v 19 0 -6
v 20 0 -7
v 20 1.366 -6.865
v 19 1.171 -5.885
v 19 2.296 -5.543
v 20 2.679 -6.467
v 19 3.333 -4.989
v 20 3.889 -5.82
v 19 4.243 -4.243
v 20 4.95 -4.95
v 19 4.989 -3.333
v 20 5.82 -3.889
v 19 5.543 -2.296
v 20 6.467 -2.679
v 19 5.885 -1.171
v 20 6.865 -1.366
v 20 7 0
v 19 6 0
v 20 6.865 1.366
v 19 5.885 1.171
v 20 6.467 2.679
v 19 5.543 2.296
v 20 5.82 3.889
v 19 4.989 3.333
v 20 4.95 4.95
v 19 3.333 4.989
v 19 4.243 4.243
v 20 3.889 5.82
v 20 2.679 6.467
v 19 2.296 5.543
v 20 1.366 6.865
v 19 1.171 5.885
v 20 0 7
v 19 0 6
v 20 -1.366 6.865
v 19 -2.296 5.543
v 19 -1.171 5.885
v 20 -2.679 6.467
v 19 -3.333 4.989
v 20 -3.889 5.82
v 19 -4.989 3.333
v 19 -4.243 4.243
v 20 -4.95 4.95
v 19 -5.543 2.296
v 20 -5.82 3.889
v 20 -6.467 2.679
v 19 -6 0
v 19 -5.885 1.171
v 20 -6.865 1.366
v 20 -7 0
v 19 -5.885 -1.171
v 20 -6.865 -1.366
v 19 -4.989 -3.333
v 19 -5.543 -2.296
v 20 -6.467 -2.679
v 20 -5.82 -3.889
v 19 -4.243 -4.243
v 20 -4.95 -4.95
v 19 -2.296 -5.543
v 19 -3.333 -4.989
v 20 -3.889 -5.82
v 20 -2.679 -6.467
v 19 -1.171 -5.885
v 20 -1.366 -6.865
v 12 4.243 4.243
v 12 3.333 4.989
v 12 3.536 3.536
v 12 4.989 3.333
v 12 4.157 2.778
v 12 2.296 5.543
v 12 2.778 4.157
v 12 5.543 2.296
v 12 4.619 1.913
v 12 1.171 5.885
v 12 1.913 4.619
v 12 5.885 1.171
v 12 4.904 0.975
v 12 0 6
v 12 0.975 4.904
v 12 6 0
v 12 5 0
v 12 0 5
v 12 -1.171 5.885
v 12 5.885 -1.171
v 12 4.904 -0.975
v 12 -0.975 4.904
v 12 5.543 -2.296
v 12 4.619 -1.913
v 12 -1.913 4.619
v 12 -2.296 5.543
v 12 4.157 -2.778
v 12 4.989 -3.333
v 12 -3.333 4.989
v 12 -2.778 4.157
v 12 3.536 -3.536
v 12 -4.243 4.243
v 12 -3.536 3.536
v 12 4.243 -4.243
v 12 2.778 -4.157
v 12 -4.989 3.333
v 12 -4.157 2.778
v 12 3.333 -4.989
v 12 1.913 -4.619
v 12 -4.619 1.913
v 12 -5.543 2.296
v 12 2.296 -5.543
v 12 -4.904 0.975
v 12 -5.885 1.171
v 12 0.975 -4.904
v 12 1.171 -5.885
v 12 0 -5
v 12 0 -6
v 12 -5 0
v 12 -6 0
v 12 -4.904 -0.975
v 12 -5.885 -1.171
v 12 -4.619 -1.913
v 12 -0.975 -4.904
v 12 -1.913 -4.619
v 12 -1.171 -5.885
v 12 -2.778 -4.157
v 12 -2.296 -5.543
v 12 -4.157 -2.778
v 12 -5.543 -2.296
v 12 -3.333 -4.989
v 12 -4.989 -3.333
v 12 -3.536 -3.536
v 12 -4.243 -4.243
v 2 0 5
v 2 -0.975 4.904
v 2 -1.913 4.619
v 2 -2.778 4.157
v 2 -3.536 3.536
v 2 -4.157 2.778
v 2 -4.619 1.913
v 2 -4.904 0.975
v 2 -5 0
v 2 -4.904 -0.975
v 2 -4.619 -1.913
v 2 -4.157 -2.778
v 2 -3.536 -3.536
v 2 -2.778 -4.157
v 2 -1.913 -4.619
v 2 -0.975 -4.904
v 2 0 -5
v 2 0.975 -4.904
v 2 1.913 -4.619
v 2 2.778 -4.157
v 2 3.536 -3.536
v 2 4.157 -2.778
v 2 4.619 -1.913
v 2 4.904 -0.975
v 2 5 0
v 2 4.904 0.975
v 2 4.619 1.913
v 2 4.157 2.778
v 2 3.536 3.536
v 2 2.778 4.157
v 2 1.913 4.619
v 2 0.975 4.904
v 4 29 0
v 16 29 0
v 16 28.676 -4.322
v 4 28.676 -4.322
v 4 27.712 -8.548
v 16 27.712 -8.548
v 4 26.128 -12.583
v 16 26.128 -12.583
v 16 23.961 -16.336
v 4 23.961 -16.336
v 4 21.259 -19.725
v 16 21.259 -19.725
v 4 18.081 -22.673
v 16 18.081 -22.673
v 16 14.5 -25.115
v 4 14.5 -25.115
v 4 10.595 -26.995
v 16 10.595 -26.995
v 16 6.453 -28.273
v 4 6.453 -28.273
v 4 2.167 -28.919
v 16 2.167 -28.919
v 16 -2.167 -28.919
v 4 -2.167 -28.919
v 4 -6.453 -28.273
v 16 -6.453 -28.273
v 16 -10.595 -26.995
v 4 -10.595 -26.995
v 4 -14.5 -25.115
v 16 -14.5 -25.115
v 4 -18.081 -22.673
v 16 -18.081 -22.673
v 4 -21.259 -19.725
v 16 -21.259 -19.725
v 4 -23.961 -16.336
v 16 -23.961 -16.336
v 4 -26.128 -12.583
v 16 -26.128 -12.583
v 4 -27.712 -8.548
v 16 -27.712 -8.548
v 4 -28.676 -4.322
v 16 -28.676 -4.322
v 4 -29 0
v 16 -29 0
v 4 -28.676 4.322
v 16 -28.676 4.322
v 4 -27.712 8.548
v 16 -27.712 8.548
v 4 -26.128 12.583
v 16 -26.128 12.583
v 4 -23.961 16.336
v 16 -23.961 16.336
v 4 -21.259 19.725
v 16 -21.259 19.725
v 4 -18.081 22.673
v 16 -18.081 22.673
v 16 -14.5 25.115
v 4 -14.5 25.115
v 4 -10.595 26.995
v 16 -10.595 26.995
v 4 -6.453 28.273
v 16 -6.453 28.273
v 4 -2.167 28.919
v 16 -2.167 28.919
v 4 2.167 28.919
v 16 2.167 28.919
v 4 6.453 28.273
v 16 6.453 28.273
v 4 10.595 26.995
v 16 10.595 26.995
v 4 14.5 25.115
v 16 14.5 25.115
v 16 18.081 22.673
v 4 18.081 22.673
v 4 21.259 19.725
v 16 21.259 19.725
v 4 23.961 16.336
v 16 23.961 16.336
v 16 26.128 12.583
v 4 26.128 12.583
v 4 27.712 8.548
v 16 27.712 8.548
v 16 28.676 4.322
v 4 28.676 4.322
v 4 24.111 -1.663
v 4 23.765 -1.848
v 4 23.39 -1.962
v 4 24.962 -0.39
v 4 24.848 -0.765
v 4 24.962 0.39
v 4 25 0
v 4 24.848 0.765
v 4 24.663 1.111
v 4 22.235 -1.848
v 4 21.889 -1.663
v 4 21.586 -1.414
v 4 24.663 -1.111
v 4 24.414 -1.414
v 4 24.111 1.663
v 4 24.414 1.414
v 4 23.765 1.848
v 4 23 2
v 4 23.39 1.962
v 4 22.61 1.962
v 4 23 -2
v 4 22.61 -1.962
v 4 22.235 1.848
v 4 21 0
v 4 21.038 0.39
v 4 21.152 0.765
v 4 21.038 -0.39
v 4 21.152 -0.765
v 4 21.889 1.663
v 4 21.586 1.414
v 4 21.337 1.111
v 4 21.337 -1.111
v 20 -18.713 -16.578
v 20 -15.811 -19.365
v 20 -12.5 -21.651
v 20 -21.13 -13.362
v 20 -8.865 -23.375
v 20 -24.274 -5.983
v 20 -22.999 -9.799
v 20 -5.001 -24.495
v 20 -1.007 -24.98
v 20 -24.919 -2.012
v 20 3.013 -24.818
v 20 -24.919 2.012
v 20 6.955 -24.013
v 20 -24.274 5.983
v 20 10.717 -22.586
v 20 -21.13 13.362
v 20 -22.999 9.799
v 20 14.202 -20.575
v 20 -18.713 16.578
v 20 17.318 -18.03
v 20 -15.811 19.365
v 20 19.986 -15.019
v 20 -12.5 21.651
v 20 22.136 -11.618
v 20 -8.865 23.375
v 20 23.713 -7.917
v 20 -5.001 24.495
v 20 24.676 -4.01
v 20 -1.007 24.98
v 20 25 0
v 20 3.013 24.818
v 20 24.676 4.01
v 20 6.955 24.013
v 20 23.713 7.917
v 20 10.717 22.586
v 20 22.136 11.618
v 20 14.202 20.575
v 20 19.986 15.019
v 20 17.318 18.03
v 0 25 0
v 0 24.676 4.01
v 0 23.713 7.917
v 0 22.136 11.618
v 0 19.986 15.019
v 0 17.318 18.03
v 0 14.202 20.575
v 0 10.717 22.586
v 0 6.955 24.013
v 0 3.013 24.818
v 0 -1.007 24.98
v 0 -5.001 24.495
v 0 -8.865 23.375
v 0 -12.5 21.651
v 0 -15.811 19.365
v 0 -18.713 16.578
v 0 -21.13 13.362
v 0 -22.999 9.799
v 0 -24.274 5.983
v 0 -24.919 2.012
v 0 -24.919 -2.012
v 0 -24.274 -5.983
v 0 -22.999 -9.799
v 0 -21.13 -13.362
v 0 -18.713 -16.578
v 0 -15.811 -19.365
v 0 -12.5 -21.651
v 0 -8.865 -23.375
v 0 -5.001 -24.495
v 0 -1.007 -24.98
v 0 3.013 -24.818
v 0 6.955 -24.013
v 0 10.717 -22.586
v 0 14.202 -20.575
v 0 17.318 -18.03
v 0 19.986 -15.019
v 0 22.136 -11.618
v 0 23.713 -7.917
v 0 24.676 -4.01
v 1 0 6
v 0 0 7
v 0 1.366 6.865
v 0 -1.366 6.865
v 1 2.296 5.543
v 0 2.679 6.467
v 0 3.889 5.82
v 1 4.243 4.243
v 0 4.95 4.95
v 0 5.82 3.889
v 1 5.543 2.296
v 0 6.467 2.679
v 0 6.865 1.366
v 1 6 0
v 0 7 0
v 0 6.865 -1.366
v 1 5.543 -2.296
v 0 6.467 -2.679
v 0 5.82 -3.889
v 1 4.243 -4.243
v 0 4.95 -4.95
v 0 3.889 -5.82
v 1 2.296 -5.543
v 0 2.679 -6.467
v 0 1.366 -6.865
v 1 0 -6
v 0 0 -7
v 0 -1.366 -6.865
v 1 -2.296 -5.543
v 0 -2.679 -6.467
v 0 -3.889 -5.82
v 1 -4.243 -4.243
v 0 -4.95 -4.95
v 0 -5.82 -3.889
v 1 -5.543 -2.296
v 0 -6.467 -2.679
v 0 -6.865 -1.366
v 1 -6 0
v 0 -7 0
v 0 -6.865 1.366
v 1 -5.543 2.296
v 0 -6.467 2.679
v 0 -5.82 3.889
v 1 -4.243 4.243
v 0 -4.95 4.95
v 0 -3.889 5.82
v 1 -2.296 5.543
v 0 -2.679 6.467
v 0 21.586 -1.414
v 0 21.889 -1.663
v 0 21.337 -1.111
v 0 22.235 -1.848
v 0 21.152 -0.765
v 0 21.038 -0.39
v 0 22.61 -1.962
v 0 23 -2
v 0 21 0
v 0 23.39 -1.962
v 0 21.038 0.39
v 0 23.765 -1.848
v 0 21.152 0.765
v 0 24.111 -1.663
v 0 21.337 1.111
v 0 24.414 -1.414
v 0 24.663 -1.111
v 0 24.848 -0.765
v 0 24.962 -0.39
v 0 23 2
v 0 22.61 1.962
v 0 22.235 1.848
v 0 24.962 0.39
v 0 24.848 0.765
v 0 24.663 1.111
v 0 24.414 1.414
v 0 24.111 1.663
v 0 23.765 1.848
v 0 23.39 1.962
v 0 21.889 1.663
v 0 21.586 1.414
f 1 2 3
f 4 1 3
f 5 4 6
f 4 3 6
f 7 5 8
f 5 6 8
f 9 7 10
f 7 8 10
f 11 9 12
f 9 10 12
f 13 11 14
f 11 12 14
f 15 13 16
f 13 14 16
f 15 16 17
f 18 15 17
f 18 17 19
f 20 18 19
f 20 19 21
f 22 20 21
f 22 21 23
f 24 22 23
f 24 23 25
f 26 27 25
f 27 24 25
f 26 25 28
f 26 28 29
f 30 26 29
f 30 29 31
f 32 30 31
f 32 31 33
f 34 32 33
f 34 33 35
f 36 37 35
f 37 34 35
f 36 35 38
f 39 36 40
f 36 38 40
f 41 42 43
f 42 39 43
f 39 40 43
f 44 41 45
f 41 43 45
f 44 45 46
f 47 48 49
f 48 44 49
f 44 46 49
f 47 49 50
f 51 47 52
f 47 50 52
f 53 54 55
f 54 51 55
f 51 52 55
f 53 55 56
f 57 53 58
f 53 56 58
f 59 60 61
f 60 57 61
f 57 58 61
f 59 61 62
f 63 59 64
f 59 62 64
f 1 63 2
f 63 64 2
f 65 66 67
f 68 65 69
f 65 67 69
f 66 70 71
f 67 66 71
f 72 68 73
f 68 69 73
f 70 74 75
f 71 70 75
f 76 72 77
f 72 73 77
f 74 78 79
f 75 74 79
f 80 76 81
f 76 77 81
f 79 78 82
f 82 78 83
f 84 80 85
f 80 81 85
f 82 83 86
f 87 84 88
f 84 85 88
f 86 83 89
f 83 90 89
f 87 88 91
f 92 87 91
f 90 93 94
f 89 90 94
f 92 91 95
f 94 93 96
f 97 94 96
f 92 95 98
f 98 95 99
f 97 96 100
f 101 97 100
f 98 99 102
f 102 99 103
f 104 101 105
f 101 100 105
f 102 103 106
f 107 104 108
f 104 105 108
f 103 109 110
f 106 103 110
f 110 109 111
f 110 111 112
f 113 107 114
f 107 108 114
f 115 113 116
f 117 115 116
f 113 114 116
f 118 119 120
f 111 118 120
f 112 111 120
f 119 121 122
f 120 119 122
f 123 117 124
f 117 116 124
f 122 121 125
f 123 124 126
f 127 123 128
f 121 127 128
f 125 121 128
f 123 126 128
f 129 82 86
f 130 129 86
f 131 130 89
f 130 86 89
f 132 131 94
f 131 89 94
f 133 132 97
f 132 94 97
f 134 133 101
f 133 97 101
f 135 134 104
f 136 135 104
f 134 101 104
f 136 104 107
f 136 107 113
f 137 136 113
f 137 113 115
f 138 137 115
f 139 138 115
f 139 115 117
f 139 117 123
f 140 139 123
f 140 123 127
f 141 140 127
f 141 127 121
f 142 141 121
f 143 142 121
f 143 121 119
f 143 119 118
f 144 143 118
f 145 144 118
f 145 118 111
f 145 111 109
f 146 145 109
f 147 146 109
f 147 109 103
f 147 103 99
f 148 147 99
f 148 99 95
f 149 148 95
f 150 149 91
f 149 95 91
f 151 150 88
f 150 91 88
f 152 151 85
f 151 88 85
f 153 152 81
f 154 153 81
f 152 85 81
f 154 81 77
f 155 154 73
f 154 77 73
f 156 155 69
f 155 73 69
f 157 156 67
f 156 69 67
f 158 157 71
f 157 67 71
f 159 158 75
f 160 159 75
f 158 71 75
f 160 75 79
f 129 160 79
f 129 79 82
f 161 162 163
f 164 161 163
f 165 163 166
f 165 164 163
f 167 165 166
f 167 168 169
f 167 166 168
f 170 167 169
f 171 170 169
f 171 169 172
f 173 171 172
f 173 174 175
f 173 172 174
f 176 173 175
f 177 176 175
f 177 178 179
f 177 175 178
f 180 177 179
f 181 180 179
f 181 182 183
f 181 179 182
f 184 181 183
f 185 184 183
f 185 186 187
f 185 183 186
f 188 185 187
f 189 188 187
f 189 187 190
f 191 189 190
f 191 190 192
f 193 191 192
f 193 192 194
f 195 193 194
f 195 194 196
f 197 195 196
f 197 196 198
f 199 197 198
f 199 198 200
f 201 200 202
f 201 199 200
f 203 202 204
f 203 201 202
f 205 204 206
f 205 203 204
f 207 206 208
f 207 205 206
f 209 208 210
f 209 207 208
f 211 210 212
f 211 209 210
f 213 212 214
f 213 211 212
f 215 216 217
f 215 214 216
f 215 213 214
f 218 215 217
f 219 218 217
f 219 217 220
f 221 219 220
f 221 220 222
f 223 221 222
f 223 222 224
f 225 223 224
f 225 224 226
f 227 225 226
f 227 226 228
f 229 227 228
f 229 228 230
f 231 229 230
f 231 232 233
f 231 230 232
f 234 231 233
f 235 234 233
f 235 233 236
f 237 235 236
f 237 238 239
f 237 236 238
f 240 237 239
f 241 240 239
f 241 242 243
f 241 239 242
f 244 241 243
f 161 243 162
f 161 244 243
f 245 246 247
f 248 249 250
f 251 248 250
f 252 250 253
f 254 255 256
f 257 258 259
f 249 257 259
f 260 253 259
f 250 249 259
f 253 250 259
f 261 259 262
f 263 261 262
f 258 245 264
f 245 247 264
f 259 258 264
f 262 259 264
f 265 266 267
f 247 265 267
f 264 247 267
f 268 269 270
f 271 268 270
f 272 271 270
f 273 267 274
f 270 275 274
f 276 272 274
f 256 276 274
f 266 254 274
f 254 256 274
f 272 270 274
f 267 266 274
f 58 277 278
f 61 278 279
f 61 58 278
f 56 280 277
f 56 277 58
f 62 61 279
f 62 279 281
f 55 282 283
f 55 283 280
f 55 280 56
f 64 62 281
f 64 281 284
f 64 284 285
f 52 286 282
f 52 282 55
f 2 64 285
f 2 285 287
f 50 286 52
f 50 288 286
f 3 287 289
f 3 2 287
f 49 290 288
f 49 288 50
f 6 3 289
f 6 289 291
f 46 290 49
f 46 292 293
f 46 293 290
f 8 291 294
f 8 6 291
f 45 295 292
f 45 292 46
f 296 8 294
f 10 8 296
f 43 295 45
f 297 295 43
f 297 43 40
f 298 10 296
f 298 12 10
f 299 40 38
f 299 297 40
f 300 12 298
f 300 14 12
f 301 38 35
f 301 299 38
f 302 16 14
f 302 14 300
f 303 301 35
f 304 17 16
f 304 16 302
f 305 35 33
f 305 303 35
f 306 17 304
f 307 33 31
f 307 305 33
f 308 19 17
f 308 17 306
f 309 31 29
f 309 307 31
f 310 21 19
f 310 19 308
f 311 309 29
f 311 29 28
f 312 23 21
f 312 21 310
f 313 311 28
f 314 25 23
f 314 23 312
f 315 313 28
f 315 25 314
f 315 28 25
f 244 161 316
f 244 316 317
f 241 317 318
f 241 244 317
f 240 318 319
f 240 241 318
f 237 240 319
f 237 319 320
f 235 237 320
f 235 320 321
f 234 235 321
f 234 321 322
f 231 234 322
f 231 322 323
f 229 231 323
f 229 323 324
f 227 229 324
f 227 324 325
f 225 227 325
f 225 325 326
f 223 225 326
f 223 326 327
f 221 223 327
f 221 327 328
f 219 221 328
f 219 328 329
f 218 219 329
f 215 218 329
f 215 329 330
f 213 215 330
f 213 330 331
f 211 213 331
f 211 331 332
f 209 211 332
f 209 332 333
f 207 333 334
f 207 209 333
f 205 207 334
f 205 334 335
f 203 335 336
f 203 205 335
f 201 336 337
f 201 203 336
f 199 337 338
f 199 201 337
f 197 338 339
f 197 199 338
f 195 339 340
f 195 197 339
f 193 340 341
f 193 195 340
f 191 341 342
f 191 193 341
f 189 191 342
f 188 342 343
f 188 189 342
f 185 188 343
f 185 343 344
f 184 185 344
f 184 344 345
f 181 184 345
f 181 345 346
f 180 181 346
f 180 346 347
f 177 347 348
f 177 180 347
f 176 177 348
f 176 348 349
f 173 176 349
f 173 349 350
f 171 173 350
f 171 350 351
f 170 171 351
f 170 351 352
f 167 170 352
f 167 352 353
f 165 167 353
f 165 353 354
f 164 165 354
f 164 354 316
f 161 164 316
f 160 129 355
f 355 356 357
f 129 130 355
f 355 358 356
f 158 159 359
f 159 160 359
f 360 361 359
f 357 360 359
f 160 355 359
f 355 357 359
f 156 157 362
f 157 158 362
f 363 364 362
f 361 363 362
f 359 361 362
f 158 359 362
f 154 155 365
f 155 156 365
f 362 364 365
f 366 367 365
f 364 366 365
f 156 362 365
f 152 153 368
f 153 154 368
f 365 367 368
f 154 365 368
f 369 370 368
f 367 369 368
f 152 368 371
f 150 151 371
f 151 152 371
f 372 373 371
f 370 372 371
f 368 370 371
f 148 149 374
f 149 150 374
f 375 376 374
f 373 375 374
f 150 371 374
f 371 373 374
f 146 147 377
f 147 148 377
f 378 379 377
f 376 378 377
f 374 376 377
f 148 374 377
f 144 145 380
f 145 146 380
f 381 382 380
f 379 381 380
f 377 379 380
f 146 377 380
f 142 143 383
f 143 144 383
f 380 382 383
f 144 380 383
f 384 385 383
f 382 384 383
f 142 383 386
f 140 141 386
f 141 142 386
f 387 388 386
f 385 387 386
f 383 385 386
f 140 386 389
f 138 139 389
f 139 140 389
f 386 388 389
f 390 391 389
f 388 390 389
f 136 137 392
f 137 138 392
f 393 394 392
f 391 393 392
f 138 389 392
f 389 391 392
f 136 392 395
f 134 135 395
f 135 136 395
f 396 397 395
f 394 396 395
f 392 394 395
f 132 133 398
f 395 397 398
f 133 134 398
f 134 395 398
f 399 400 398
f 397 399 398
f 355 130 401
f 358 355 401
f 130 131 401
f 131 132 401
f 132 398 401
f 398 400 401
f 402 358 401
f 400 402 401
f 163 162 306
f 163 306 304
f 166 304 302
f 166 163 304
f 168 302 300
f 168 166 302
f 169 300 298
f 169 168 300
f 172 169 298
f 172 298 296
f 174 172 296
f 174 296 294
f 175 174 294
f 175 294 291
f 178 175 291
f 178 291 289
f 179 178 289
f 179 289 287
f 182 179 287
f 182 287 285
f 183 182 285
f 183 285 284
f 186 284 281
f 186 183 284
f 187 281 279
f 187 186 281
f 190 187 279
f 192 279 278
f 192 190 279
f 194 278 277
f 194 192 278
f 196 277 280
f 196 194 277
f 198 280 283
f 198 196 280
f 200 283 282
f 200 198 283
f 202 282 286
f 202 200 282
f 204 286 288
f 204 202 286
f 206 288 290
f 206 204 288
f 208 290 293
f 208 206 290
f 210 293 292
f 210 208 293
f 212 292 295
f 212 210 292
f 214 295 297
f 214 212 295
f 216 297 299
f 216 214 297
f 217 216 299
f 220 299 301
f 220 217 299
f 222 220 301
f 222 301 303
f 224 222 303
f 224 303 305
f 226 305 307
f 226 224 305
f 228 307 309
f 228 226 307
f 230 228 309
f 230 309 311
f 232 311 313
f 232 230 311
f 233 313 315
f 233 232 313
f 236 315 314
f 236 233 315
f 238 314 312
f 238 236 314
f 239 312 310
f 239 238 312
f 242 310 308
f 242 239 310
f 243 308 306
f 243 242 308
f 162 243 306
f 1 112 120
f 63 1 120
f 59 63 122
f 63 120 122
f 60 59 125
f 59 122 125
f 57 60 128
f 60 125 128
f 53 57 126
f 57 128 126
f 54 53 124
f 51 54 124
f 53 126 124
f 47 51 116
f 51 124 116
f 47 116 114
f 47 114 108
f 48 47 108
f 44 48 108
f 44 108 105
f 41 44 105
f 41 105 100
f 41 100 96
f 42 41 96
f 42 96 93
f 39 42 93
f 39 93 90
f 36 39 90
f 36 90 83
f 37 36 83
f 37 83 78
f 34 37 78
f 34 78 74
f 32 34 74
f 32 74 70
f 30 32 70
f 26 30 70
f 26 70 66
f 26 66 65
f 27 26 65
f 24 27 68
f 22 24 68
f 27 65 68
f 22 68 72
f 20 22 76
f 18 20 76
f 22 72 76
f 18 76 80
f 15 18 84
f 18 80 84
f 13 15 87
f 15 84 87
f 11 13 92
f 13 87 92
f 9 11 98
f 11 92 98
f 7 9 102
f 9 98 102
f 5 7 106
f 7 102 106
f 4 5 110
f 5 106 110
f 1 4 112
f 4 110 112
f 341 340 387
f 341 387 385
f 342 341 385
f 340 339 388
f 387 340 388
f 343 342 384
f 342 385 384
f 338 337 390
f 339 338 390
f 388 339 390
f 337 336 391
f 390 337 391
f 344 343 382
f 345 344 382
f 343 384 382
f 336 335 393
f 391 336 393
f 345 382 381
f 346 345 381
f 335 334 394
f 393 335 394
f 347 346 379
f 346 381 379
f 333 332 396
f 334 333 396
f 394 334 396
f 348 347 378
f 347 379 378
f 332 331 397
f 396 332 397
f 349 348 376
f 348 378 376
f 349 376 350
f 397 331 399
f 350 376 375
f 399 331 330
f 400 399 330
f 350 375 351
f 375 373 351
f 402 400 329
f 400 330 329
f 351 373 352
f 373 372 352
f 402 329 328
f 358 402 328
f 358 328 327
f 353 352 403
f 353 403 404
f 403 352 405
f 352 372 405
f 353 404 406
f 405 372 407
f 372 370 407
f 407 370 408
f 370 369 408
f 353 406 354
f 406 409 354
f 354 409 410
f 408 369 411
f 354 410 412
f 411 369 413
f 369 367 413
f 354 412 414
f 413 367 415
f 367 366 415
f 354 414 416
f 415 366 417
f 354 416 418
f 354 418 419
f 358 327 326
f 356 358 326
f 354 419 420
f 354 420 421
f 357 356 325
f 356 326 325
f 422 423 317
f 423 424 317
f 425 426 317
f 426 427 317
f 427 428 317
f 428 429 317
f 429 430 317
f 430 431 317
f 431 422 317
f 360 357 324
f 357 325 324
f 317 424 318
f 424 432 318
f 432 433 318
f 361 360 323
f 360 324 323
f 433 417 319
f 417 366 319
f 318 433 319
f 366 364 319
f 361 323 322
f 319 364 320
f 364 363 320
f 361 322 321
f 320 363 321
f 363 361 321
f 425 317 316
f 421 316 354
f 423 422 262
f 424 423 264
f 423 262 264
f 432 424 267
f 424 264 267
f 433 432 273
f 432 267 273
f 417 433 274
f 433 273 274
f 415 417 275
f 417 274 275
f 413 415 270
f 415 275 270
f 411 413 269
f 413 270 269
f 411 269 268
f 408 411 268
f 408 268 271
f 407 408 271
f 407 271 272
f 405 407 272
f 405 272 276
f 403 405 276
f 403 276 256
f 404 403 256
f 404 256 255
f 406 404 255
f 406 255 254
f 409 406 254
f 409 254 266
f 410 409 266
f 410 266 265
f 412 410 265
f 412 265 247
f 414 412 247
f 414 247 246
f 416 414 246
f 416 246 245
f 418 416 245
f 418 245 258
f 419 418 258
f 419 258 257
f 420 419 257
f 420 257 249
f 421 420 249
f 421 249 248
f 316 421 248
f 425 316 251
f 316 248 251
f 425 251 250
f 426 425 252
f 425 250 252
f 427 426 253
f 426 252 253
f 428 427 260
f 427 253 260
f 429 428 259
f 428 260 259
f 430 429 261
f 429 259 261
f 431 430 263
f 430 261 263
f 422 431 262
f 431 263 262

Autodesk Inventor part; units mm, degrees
ref_plane "YZ Plane" through (0, 0, 0) normal (1, 0, 0) x (0, 1, 0)
ref_plane "XZ Plane" through (0, 0, 0) normal (0, 1, 0) x (-1, 0, 0)
ref_plane "XY Plane" through (0, 0, 0) normal (0, 0, 1) x (1, 0, 0)
sketch "Эскиз4" plane through (0, 0, 0) normal (0, 0, 1) x (1, 0, 0)
  line L0 (0, 0) -> (20, 0)
  line L1 (20, 0) -> (20, 25)
  line L2 (16, 29) -> (4, 29)
  line L3 (0, 25) -> (0, 0)
  line L4 (4, 29) -> (0, 25)
  line L5 (16, 29) -> (20, 25)
  point P0 (20, 29)
  point P1 (0, 29)
  dimension "d33" = 20
  dimension "d34" = 29
  dimension "d35" = 4
  dimension "d36" = 4
  dimension "d37" = 4
  dimension "d38" = 4
revolve "Вращение3" add sketch "Эскиз4" angle 360 about axis through (0, 0, 0) along (1, 0, 0)
sketch "Эскиз5" plane through (20, 0, 0) normal (1, 0, 0) x (0, 0, -1)
  point P0 (0, 0)
  point P1 (0, 0)
hole "Отверстие2" at (20, 0, 0) direction (-1, 0, 0) diameter 12 depth 8 countersink diameter 14 countersink angle 90
sketch "Эскиз6" plane through (0, 0, 0) normal (-1, 0, 0) x (0, 0, 1)
  point P0 (0, 0)
  point P1 (0, 0)
hole "Отверстие3" at (0, 0, 0) direction (1, 0, 0) diameter 10 depth 12 countersink diameter 14 countersink angle 90
sketch "Эскиз7" plane through (0, 0, 0) normal (-1, 0, 0) x (0, 0, 1)
  line L0 (0, 0) -> (0, 23) construction
  dimension "d54" = 23
hole "Отверстие4" at (0, 23, 0) direction (1, 0, 0) diameter 4 depth 4
thread "Резьба3" size "M12x1.75" class "6H" standard "ANSI Metric M Profile" full length
equation "\"d36\" = d35"
equation "\"d37\" = d35"
equation "\"d38\" = d37"
properties part number "711135"
